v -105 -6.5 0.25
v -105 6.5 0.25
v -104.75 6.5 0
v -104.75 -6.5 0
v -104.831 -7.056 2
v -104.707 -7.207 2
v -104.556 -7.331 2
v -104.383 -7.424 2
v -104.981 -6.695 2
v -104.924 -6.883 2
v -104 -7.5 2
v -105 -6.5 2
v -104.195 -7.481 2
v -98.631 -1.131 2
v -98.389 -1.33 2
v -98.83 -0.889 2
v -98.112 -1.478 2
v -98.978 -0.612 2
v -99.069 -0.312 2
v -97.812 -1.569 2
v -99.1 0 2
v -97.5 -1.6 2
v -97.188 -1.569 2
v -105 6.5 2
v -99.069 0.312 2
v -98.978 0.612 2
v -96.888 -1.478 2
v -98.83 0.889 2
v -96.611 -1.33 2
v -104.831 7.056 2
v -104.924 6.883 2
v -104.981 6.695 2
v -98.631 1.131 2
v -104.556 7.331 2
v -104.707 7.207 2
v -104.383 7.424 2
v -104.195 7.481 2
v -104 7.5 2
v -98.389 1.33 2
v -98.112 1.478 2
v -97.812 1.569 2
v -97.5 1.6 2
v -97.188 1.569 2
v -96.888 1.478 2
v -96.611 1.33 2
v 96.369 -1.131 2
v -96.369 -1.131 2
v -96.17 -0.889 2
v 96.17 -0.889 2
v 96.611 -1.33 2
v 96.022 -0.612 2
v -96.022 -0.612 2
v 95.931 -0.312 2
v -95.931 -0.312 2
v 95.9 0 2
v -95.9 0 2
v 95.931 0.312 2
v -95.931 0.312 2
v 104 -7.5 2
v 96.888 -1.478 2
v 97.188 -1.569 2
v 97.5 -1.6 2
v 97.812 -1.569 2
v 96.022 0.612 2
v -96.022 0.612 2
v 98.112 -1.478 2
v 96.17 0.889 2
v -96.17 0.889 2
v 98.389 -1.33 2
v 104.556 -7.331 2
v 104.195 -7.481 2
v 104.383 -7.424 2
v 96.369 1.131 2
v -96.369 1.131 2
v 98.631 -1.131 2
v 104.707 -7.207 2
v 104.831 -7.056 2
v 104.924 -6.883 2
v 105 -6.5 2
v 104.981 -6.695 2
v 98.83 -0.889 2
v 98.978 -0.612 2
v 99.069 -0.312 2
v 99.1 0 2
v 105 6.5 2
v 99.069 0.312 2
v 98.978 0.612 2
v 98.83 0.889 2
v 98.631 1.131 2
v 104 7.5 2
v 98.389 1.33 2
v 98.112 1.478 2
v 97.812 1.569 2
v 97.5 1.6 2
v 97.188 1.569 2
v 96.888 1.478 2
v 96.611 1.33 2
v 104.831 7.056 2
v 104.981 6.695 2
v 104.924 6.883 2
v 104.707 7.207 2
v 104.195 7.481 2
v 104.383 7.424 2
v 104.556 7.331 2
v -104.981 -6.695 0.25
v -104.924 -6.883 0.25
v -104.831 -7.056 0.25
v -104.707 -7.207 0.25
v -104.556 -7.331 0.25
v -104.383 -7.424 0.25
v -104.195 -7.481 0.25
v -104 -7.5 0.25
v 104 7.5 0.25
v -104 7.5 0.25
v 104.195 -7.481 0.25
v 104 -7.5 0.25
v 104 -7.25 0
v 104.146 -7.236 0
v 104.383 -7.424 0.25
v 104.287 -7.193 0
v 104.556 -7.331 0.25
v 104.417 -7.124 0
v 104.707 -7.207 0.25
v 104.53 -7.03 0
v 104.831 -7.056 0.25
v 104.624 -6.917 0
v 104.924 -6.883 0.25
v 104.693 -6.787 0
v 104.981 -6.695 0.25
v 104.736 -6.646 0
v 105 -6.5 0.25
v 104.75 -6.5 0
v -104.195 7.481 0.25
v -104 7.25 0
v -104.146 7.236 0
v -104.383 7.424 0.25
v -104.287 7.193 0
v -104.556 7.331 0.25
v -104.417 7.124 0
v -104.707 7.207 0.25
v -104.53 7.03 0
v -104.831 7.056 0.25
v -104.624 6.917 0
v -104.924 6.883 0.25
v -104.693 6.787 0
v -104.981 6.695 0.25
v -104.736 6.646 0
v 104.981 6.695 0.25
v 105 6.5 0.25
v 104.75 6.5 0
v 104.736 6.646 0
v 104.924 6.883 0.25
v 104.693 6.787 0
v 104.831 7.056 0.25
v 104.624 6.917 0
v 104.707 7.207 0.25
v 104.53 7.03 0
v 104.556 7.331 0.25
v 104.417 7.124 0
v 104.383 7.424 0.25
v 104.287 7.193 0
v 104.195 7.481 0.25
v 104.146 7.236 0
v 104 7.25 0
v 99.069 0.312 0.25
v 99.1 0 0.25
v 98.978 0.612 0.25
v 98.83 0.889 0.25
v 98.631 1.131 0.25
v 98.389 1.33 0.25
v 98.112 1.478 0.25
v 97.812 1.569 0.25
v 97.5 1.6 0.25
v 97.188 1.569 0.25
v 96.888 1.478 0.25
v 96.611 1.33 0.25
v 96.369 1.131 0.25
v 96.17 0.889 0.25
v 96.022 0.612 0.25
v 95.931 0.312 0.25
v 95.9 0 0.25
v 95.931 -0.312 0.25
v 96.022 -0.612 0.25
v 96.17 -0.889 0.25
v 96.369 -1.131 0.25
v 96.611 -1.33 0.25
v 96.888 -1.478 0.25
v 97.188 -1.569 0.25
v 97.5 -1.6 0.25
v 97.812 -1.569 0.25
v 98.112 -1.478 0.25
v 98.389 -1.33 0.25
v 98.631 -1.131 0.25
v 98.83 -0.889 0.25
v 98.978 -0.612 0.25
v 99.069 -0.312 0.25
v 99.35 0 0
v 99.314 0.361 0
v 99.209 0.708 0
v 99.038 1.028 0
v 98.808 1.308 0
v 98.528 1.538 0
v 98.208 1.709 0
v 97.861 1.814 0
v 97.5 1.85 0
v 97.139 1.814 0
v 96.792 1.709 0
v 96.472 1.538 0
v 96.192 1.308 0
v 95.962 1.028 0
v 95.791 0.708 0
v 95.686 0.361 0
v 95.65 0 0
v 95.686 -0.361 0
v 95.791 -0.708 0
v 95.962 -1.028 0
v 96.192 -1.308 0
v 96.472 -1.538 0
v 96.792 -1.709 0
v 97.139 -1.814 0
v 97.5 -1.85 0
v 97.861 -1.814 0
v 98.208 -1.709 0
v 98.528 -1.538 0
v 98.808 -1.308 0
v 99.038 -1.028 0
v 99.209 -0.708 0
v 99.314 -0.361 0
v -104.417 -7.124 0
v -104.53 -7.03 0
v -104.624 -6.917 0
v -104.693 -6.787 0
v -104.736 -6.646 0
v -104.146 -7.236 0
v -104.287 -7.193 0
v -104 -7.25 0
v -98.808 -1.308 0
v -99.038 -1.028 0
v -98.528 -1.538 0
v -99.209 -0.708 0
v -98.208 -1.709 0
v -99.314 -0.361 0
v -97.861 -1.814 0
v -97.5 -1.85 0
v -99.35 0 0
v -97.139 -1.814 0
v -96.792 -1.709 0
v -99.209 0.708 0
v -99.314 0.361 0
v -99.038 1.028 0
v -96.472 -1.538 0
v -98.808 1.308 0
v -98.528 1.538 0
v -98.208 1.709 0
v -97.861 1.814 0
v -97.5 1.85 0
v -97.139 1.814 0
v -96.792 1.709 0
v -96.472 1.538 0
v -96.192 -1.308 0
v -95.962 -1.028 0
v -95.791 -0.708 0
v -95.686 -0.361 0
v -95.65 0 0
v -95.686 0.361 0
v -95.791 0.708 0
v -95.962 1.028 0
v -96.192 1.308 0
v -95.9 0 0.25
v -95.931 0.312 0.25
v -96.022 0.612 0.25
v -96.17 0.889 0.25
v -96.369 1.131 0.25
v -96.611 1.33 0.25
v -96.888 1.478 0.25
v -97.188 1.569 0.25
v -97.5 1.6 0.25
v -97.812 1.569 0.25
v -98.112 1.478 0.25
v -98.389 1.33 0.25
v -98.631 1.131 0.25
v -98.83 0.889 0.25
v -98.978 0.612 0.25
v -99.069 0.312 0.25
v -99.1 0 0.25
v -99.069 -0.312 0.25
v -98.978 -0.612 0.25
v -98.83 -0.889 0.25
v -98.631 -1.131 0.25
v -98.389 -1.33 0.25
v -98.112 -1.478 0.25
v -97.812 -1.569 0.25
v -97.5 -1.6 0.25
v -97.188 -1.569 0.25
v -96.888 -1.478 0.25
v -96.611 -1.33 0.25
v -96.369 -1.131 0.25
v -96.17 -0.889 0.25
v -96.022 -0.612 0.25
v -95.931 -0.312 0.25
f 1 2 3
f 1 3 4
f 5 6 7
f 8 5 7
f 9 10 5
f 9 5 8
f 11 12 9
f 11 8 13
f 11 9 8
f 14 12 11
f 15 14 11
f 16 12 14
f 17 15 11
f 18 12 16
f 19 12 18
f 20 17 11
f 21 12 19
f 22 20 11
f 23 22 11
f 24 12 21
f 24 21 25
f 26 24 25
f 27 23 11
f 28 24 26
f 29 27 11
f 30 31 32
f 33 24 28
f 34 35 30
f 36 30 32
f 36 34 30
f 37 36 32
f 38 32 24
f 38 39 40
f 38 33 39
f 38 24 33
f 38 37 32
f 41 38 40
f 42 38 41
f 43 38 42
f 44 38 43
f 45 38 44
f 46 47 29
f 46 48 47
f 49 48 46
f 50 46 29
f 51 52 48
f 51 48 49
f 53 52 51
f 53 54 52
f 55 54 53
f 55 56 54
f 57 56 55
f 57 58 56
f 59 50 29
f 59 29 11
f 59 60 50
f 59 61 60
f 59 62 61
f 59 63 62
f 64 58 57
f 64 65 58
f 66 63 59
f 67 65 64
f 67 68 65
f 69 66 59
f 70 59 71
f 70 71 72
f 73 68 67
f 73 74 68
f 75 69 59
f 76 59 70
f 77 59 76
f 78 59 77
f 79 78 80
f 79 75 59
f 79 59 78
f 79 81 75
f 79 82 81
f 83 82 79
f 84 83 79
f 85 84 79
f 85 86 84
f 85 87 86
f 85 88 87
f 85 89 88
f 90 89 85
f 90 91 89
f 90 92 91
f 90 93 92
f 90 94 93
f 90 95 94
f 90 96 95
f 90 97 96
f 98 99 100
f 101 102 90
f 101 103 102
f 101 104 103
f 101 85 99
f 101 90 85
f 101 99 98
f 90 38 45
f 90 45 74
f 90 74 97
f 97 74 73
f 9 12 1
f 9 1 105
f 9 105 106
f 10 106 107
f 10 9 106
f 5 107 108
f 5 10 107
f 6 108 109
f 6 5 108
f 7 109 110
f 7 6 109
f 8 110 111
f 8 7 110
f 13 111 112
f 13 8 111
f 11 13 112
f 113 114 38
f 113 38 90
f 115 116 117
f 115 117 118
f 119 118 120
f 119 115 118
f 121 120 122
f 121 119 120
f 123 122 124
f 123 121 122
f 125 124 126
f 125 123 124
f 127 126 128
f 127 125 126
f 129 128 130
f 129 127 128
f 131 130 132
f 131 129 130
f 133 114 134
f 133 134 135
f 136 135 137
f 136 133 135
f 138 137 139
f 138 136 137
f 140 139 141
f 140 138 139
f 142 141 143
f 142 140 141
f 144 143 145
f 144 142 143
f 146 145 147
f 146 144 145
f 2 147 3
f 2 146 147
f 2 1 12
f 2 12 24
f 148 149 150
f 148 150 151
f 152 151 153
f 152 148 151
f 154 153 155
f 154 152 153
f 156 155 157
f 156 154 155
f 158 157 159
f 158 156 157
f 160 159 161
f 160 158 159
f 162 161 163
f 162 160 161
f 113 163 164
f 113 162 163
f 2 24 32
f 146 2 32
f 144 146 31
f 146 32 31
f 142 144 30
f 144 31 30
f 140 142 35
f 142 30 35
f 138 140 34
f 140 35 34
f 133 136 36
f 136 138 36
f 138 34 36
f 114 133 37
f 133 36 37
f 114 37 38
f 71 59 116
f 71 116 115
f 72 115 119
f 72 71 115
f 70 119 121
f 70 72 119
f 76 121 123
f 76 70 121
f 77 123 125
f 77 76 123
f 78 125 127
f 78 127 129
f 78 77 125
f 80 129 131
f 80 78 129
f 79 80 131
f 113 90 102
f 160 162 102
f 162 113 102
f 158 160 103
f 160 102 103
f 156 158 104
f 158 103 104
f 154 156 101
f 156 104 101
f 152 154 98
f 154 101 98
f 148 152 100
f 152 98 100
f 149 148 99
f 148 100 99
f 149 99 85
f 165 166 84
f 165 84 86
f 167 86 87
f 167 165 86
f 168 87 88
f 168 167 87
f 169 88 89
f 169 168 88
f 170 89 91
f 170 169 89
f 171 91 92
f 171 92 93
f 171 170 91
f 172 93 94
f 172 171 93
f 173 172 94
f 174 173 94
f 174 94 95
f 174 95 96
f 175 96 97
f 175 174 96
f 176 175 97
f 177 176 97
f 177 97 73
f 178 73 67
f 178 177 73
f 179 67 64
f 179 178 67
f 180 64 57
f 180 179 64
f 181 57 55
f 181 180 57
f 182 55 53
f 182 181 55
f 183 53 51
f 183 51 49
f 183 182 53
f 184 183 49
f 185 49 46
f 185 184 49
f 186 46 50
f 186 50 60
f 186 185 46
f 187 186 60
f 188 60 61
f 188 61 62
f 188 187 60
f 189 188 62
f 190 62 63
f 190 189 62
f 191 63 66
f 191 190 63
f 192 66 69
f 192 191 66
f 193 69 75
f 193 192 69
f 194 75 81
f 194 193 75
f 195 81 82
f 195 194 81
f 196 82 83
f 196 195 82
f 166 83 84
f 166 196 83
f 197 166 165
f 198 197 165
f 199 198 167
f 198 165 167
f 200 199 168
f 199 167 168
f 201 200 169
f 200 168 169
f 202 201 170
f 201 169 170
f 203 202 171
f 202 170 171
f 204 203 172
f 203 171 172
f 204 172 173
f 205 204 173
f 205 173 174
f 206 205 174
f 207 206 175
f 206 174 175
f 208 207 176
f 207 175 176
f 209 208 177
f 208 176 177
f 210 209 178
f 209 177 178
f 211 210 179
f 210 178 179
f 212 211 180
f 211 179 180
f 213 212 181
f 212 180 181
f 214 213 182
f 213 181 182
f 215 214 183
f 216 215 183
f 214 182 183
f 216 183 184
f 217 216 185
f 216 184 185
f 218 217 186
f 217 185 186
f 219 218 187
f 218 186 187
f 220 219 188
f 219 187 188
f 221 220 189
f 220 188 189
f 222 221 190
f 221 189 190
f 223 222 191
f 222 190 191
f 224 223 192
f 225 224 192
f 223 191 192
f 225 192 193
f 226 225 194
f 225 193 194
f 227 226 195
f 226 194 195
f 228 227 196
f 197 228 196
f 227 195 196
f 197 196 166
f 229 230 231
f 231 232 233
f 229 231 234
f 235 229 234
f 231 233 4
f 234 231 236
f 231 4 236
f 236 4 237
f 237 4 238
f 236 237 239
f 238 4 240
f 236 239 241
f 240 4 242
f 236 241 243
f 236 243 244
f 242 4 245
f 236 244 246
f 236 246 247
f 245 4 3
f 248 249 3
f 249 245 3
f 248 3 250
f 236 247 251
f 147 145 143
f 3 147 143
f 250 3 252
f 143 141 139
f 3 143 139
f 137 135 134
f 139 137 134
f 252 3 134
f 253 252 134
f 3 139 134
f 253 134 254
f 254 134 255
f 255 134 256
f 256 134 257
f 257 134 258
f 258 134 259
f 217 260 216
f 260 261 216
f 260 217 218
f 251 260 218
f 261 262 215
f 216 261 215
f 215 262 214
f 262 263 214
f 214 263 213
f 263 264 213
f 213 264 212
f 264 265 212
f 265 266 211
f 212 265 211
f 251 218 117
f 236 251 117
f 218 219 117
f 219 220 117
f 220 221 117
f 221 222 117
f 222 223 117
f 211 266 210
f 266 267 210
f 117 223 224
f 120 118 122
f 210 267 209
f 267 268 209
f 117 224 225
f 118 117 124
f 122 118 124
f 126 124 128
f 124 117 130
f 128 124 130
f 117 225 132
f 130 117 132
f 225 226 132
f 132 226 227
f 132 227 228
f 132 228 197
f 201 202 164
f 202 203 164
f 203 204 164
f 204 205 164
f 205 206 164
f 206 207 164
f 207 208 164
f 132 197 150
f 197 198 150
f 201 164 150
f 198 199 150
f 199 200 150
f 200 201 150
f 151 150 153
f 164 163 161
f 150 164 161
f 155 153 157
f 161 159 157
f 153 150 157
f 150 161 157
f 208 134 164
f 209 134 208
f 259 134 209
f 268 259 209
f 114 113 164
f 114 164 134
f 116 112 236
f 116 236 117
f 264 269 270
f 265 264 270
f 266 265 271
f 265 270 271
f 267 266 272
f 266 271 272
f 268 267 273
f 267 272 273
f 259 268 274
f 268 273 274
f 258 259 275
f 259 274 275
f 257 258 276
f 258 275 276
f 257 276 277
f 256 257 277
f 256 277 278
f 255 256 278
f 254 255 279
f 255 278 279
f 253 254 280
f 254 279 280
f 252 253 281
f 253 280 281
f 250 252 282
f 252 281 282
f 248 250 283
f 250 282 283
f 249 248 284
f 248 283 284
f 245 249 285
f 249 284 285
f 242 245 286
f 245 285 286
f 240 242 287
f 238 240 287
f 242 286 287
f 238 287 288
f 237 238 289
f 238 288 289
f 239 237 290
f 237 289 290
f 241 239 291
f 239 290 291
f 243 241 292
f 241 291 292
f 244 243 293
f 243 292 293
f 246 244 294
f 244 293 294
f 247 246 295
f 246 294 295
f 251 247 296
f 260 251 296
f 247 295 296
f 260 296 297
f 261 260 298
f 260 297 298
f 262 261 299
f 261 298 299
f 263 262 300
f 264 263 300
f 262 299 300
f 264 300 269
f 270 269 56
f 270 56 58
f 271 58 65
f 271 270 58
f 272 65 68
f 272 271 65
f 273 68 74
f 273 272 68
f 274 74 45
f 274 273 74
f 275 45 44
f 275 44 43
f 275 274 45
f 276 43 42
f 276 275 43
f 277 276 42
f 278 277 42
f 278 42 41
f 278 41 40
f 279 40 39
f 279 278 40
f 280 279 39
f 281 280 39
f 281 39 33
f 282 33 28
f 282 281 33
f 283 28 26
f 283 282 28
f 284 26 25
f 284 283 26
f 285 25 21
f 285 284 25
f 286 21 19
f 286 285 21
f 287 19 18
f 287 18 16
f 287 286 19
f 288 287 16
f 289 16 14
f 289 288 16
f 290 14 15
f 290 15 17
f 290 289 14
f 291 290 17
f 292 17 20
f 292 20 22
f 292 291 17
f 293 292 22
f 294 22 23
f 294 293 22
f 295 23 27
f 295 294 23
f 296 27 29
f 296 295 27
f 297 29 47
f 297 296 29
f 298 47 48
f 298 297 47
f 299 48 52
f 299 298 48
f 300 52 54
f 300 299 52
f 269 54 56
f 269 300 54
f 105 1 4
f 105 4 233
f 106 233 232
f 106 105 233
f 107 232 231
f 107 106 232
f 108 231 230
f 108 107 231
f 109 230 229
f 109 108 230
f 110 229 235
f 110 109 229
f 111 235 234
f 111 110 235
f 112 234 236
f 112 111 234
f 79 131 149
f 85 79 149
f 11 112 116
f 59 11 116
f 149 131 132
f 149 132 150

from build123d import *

# Parameters (mm, degrees)
F0_W     = 210
F0_H     = 15
F0_R     = 1.6
F1_DEPTH = 2
F2_R     = 1
F3_SIZE  = 0.25


with BuildPart() as f1:
    # F0 (on Top) → F1 (new body)
    with BuildSketch(Plane.XY):
        Rectangle(F0_W, F0_H)
        with Locations((-97.5, 0)):
            Circle(F0_R, mode=Mode.SUBTRACT)
        with Locations((97.5, 0)):
            Circle(F0_R, mode=Mode.SUBTRACT)
    extrude(amount=F1_DEPTH)

    # F2
    f2_edges = [f1.edges().sort_by_distance(p)[0] for p in [
        (-105, 7.5, 1),
        (-105, -7.5, 1),
        (105, 7.5, 1),
        (105, -7.5, 1),
    ]]
    fillet(f2_edges, radius=F2_R)

    # F3
    f3_edges = [f1.edges().sort_by_distance(p)[0] for p in [
        (0, -7.5, 0),
        (-104.707107, -7.207107, 0),
        (104.707107, -7.207107, 0),
        (-105, 0, 0),
        (105, 0, 0),
        (-104.707107, 7.207107, 0),
        (104.707107, 7.207107, 0),
        (0, 7.5, 0),
        (-99.1, 0, 0),
        (95.9, 0, 0),
    ]]
    chamfer(f3_edges, length=F3_SIZE)


solid = f1.part
